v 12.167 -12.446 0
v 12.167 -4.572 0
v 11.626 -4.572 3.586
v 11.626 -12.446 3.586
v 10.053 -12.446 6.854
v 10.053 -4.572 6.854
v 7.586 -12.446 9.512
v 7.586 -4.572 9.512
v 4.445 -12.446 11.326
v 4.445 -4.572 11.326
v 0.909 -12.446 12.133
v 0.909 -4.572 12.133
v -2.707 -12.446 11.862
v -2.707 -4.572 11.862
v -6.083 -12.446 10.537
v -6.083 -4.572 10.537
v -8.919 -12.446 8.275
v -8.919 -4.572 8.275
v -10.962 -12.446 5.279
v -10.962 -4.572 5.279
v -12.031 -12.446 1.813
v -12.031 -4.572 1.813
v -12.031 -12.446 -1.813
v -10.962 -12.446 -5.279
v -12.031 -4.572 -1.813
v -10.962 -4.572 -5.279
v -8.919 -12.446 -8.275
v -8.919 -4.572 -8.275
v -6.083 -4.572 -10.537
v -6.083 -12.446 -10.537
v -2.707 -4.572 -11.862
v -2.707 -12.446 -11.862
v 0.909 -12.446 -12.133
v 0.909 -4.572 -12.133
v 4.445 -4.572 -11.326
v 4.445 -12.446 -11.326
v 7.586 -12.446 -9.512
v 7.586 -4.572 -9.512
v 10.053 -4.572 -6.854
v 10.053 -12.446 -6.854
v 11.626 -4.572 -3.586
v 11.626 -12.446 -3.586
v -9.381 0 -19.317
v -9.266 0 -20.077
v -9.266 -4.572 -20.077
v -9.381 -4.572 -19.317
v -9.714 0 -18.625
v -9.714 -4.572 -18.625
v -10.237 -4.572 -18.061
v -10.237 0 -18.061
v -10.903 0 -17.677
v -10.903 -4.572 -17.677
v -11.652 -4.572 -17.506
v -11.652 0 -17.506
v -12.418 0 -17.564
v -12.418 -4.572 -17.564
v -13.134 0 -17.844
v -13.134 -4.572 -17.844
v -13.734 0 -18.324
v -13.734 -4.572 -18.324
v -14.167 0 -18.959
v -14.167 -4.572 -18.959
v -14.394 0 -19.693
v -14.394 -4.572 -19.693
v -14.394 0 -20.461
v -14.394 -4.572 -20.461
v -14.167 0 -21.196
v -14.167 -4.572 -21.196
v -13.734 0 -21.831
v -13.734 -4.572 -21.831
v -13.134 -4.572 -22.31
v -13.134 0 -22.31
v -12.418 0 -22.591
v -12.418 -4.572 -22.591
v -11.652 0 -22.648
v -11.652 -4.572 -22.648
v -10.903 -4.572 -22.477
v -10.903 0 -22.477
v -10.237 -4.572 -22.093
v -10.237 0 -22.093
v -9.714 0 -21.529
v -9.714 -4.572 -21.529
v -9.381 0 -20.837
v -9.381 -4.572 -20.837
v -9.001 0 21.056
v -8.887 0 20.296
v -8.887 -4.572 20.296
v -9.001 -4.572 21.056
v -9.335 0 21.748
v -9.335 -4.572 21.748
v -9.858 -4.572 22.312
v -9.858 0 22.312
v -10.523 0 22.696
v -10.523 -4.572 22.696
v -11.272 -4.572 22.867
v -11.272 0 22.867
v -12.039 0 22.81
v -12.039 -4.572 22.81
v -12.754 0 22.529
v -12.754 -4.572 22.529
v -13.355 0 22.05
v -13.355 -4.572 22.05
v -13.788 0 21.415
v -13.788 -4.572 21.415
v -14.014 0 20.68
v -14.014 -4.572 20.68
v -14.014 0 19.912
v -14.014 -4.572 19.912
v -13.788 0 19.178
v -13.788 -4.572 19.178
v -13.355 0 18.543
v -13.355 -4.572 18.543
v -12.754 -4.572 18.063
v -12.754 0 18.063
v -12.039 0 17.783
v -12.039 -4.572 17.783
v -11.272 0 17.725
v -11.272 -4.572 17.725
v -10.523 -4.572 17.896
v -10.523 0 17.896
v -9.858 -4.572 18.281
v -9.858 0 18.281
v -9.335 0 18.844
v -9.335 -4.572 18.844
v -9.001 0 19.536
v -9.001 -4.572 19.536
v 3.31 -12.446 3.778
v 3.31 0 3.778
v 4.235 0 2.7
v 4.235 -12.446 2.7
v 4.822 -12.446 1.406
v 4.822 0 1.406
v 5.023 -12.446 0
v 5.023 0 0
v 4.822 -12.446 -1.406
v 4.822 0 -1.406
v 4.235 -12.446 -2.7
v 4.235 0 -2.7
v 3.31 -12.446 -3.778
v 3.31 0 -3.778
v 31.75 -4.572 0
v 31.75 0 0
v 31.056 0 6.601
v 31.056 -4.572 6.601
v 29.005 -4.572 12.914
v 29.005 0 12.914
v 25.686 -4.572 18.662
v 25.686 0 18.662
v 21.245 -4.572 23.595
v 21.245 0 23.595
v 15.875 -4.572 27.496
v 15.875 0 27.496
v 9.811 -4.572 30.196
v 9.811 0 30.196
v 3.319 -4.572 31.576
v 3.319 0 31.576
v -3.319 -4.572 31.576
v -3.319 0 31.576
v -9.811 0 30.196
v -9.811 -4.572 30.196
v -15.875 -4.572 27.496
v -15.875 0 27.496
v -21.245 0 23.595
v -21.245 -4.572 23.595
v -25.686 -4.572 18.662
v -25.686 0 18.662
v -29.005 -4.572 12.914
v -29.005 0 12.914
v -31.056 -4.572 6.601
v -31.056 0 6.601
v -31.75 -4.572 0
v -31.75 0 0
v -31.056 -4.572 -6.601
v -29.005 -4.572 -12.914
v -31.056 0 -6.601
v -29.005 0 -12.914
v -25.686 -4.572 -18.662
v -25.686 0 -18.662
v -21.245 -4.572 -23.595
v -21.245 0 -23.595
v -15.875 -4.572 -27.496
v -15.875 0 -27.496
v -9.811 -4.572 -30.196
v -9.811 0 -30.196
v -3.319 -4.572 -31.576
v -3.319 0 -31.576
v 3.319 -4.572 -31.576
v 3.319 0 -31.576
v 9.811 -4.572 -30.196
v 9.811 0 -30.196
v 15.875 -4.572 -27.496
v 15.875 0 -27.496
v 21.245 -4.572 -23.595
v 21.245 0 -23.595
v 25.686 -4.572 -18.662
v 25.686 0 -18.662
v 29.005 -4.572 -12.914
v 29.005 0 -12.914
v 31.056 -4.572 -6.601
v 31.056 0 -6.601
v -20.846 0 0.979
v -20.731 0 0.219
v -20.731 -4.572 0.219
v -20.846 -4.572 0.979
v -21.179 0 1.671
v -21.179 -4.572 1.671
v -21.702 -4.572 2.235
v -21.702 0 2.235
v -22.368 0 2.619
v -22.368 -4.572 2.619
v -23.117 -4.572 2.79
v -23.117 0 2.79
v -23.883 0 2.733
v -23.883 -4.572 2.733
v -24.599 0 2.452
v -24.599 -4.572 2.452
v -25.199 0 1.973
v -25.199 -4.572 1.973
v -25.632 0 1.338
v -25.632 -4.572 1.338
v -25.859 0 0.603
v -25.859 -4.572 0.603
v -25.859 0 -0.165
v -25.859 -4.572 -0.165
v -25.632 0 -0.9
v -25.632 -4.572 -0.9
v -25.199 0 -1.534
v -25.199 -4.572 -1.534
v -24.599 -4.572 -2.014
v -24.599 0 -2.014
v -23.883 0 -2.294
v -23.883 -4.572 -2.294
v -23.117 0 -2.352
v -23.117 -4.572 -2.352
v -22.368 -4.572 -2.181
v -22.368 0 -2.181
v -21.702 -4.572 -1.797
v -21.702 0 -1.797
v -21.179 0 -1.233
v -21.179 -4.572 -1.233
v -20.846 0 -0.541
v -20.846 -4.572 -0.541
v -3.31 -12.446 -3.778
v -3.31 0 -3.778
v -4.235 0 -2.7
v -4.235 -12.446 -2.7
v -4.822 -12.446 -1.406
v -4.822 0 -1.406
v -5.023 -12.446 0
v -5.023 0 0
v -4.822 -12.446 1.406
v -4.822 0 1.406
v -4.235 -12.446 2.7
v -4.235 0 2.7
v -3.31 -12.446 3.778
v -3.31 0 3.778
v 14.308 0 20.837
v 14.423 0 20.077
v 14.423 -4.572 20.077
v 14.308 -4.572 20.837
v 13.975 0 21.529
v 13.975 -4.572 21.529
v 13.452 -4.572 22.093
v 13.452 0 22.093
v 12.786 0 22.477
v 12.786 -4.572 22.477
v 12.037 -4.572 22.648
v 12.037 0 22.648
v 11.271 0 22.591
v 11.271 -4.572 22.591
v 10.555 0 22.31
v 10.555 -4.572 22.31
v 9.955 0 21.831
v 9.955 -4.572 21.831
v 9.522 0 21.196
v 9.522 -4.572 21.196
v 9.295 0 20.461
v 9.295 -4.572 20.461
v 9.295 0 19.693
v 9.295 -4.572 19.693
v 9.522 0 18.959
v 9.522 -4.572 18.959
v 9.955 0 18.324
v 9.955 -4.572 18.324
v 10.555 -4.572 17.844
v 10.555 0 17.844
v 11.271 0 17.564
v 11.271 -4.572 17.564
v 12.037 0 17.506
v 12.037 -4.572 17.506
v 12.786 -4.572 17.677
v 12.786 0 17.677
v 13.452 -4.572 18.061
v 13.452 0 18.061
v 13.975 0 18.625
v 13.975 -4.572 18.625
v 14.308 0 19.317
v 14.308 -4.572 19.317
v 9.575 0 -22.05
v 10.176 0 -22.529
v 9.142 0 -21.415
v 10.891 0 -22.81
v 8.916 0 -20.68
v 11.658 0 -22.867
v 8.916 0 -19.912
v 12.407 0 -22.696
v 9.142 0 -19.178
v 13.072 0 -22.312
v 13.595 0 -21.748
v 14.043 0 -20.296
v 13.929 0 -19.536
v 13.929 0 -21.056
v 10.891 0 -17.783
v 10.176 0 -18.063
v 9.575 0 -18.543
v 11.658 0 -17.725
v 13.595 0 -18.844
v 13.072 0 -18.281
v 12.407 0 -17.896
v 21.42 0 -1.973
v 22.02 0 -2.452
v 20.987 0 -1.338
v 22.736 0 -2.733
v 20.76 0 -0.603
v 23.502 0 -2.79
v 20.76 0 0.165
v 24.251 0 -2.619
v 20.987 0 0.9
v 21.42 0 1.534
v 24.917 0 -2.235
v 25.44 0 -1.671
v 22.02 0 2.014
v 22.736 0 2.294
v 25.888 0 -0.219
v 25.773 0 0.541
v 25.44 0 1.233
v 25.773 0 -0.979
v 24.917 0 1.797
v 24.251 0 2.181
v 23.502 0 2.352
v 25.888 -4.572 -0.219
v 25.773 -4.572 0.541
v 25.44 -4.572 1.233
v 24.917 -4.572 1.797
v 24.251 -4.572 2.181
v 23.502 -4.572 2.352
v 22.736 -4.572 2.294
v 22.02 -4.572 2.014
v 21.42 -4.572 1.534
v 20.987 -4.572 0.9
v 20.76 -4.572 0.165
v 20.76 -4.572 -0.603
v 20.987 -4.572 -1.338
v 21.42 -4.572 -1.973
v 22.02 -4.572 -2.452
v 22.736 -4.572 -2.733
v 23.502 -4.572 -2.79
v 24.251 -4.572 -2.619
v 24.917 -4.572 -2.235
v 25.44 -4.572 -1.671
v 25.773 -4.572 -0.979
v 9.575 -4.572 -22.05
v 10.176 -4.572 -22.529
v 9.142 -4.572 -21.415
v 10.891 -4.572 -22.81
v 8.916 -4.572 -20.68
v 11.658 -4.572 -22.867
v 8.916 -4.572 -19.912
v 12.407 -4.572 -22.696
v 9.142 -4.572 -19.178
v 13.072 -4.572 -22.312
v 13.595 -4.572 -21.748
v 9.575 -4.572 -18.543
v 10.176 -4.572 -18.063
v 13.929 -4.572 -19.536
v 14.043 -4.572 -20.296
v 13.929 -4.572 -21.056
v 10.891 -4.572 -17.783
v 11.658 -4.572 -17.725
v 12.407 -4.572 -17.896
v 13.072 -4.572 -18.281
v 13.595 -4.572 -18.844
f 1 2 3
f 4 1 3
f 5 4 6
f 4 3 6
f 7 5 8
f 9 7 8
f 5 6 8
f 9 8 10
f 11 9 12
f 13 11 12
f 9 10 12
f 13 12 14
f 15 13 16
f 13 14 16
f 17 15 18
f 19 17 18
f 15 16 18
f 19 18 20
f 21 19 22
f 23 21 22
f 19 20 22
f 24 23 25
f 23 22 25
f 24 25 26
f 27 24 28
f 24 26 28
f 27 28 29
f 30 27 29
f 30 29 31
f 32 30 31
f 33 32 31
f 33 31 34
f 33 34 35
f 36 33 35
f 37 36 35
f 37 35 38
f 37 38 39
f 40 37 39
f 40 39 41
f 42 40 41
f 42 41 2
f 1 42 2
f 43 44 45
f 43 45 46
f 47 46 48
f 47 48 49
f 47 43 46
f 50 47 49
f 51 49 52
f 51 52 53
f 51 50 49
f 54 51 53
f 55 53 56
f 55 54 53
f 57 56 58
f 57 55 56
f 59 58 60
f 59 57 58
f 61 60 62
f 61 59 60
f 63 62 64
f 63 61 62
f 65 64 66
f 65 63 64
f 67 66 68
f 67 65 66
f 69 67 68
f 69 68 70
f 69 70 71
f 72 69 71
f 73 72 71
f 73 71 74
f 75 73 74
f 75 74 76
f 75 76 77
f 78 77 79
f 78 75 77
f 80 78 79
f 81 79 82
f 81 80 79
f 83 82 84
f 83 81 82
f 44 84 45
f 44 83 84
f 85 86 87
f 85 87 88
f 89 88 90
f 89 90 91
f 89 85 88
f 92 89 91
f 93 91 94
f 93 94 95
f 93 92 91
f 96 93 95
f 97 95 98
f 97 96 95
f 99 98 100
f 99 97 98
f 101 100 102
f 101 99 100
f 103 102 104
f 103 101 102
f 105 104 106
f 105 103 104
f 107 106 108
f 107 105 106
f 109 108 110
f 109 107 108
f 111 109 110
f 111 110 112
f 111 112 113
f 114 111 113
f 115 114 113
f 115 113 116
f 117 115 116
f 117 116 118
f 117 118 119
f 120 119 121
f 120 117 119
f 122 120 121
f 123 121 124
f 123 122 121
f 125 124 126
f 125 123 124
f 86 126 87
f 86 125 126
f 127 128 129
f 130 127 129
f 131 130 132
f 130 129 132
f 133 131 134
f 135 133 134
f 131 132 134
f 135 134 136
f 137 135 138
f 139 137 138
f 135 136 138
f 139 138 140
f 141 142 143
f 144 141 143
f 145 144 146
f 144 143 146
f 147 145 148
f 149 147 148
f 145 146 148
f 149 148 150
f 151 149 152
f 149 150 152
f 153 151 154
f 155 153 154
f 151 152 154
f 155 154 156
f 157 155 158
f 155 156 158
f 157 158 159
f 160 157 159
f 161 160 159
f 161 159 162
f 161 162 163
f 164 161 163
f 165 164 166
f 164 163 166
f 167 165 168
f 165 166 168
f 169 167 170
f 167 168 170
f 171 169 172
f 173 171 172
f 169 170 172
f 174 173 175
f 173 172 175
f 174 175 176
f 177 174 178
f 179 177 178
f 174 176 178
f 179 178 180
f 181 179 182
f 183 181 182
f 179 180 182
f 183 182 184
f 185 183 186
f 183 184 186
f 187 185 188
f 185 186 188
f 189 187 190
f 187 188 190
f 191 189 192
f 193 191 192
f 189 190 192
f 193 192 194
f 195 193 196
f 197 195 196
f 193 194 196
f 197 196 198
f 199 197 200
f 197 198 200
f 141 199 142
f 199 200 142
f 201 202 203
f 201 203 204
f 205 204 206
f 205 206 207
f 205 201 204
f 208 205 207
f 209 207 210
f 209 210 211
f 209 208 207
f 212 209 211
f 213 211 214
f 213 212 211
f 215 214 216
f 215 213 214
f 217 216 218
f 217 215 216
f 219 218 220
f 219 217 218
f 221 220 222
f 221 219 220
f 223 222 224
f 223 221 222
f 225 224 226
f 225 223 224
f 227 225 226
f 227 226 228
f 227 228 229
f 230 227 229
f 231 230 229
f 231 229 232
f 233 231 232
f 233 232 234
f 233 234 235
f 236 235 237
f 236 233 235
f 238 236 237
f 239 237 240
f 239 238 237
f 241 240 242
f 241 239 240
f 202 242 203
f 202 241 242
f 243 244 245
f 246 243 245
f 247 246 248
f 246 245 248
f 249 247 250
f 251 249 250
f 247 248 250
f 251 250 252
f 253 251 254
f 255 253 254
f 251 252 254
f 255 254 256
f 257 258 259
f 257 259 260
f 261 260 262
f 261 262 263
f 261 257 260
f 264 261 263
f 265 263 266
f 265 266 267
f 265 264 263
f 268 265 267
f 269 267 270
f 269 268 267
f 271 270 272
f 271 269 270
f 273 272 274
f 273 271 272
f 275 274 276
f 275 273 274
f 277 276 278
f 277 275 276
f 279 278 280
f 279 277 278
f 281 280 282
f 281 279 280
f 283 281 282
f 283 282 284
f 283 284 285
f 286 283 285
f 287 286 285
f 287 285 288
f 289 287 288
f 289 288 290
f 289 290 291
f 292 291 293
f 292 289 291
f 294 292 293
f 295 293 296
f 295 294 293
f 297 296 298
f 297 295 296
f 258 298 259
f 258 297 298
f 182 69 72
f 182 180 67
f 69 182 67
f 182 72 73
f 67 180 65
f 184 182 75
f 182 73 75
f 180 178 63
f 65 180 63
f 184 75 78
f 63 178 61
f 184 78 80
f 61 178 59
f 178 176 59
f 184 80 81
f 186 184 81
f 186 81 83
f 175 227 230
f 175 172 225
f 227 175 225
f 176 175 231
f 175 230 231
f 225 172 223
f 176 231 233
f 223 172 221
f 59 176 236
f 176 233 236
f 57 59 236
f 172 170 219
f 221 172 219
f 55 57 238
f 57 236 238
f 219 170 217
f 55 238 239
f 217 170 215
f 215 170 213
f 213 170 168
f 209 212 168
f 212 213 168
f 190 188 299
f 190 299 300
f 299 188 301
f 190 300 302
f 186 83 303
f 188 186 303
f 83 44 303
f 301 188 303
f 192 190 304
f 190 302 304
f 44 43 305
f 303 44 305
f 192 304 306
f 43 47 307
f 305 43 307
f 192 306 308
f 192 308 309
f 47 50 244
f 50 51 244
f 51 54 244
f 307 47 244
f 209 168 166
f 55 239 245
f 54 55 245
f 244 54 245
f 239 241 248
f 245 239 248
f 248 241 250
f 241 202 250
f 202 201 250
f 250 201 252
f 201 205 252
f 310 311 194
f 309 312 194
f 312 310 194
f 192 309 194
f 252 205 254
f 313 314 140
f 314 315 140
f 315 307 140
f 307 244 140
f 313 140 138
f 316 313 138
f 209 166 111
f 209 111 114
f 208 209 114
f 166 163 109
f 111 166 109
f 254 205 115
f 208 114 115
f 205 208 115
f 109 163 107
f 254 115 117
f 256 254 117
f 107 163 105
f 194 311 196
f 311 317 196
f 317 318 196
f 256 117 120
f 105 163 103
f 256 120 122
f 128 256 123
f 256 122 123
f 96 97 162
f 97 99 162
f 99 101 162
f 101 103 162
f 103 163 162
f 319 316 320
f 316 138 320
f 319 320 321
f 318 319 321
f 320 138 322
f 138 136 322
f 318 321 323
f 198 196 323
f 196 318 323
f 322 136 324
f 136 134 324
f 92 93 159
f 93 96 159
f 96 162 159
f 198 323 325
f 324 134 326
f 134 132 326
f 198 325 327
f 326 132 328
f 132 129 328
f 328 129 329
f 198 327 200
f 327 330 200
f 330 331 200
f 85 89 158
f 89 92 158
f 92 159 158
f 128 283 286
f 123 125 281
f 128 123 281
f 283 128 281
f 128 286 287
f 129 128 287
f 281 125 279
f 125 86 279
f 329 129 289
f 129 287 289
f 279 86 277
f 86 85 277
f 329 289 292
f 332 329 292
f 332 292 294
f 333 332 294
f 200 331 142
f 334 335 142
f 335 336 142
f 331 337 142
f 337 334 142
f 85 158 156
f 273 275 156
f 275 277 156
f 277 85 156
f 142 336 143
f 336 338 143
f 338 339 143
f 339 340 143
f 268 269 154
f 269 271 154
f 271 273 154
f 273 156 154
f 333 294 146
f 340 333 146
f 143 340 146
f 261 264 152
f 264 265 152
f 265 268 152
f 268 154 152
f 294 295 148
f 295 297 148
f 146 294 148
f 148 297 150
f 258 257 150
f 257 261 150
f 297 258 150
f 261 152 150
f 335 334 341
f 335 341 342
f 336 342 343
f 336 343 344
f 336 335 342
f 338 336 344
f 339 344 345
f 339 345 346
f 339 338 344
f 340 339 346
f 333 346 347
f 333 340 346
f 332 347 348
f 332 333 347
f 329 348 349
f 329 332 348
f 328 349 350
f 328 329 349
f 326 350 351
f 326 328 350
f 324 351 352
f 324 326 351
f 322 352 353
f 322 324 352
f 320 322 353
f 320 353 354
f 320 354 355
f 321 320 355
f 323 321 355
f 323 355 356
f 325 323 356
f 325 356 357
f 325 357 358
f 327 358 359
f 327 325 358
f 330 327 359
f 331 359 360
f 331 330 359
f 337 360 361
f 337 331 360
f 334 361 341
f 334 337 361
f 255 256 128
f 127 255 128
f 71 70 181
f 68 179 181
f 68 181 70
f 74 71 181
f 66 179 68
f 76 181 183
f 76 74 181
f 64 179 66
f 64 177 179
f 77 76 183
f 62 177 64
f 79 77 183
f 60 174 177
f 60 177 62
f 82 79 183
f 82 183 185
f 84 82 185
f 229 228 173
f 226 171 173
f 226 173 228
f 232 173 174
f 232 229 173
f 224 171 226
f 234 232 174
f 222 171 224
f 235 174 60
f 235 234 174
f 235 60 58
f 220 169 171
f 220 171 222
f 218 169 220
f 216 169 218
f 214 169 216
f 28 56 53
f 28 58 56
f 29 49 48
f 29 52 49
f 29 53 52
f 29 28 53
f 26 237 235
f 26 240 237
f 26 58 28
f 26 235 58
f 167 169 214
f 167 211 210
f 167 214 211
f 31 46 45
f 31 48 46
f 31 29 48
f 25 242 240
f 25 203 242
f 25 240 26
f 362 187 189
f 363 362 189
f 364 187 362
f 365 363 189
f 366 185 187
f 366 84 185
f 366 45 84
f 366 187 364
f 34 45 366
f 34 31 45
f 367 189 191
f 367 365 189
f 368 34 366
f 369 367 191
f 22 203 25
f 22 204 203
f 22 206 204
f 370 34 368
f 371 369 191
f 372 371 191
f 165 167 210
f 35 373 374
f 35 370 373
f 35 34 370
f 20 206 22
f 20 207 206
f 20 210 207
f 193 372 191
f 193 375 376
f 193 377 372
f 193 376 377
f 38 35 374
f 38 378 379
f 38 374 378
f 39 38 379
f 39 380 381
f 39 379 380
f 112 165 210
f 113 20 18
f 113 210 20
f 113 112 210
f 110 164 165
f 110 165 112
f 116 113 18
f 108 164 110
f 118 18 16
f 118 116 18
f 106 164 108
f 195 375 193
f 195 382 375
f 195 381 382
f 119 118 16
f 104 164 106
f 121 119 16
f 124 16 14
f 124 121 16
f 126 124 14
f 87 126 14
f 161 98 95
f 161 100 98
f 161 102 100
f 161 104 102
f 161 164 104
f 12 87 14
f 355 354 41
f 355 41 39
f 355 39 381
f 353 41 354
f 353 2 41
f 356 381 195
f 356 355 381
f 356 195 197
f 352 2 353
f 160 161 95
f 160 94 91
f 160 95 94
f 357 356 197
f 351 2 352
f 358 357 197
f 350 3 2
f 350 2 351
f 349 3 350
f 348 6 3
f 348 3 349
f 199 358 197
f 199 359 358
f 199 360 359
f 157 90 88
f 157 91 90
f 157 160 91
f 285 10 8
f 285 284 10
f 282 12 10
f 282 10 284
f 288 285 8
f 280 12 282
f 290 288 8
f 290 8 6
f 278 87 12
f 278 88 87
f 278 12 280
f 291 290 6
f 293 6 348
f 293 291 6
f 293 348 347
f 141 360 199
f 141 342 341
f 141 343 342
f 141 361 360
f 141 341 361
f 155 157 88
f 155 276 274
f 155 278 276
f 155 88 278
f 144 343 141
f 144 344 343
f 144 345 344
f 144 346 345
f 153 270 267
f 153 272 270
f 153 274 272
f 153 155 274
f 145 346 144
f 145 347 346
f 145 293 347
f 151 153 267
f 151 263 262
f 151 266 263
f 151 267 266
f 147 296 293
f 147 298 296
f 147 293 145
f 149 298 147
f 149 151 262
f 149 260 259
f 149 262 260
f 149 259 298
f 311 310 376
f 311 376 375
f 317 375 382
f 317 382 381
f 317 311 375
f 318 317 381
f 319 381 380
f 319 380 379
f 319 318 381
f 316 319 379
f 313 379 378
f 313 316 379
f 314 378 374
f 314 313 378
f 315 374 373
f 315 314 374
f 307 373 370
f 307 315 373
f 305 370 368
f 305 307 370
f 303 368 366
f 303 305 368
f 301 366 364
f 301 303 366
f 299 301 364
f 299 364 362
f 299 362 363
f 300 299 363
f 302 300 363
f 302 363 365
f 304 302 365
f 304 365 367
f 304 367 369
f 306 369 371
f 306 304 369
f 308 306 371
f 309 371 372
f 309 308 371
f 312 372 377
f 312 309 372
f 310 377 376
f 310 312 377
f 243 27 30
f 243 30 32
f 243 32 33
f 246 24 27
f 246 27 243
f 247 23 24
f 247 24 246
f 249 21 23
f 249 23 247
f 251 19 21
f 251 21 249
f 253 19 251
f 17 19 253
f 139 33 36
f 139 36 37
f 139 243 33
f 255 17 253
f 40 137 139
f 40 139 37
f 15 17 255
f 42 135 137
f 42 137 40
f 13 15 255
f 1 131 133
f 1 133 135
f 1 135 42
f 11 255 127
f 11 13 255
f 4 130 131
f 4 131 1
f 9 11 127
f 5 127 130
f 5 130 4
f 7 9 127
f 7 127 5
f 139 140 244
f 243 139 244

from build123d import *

# Parameters (mm, degrees)
F0_R     = 12.1666
F1_DEPTH = 12.446
F0_R_2   = 31.75
F0_R_3   = 2.5781
F2_DEPTH = 4.572


with BuildPart() as f1:
    # F0 (on Front) → F1 (new body)
    with BuildSketch(Plane.XZ):
        Circle(F0_R)
        with BuildLine():
            ThreePointArc((3.30966, 3.77825), (5.02285, 0), (3.30966, -3.77825))
            Line((3.30966, -3.77825), (-3.30966, -3.77825))
            ThreePointArc((-3.30966, -3.77825), (-5.02285, 0), (-3.30966, 3.77825))
            Line((-3.30966, 3.77825), (3.30966, 3.77825))
        make_face(mode=Mode.SUBTRACT)
    extrude(amount=F1_DEPTH)

    # F0 (on Front) → F2 (join)
    with BuildSketch(Plane.XZ):
        Circle(F0_R_2)
        with Locations((-11.844468, -20.0771)):
            Circle(F0_R_3, mode=Mode.SUBTRACT)
        with Locations((11.465044, -20.29616)):
            Circle(F0_R_3, mode=Mode.SUBTRACT)
        with Locations((23.309512, -0.21906)):
            Circle(F0_R_3, mode=Mode.SUBTRACT)
        with Locations((-23.309512, 0.21906)):
            Circle(F0_R_3, mode=Mode.SUBTRACT)
        with Locations((-11.465044, 20.29616)):
            Circle(F0_R_3, mode=Mode.SUBTRACT)
        Circle(F0_R, mode=Mode.SUBTRACT)
        with Locations((11.844468, 20.0771)):
            Circle(F0_R_3, mode=Mode.SUBTRACT)
    extrude(amount=F2_DEPTH)


solid = f1.part
